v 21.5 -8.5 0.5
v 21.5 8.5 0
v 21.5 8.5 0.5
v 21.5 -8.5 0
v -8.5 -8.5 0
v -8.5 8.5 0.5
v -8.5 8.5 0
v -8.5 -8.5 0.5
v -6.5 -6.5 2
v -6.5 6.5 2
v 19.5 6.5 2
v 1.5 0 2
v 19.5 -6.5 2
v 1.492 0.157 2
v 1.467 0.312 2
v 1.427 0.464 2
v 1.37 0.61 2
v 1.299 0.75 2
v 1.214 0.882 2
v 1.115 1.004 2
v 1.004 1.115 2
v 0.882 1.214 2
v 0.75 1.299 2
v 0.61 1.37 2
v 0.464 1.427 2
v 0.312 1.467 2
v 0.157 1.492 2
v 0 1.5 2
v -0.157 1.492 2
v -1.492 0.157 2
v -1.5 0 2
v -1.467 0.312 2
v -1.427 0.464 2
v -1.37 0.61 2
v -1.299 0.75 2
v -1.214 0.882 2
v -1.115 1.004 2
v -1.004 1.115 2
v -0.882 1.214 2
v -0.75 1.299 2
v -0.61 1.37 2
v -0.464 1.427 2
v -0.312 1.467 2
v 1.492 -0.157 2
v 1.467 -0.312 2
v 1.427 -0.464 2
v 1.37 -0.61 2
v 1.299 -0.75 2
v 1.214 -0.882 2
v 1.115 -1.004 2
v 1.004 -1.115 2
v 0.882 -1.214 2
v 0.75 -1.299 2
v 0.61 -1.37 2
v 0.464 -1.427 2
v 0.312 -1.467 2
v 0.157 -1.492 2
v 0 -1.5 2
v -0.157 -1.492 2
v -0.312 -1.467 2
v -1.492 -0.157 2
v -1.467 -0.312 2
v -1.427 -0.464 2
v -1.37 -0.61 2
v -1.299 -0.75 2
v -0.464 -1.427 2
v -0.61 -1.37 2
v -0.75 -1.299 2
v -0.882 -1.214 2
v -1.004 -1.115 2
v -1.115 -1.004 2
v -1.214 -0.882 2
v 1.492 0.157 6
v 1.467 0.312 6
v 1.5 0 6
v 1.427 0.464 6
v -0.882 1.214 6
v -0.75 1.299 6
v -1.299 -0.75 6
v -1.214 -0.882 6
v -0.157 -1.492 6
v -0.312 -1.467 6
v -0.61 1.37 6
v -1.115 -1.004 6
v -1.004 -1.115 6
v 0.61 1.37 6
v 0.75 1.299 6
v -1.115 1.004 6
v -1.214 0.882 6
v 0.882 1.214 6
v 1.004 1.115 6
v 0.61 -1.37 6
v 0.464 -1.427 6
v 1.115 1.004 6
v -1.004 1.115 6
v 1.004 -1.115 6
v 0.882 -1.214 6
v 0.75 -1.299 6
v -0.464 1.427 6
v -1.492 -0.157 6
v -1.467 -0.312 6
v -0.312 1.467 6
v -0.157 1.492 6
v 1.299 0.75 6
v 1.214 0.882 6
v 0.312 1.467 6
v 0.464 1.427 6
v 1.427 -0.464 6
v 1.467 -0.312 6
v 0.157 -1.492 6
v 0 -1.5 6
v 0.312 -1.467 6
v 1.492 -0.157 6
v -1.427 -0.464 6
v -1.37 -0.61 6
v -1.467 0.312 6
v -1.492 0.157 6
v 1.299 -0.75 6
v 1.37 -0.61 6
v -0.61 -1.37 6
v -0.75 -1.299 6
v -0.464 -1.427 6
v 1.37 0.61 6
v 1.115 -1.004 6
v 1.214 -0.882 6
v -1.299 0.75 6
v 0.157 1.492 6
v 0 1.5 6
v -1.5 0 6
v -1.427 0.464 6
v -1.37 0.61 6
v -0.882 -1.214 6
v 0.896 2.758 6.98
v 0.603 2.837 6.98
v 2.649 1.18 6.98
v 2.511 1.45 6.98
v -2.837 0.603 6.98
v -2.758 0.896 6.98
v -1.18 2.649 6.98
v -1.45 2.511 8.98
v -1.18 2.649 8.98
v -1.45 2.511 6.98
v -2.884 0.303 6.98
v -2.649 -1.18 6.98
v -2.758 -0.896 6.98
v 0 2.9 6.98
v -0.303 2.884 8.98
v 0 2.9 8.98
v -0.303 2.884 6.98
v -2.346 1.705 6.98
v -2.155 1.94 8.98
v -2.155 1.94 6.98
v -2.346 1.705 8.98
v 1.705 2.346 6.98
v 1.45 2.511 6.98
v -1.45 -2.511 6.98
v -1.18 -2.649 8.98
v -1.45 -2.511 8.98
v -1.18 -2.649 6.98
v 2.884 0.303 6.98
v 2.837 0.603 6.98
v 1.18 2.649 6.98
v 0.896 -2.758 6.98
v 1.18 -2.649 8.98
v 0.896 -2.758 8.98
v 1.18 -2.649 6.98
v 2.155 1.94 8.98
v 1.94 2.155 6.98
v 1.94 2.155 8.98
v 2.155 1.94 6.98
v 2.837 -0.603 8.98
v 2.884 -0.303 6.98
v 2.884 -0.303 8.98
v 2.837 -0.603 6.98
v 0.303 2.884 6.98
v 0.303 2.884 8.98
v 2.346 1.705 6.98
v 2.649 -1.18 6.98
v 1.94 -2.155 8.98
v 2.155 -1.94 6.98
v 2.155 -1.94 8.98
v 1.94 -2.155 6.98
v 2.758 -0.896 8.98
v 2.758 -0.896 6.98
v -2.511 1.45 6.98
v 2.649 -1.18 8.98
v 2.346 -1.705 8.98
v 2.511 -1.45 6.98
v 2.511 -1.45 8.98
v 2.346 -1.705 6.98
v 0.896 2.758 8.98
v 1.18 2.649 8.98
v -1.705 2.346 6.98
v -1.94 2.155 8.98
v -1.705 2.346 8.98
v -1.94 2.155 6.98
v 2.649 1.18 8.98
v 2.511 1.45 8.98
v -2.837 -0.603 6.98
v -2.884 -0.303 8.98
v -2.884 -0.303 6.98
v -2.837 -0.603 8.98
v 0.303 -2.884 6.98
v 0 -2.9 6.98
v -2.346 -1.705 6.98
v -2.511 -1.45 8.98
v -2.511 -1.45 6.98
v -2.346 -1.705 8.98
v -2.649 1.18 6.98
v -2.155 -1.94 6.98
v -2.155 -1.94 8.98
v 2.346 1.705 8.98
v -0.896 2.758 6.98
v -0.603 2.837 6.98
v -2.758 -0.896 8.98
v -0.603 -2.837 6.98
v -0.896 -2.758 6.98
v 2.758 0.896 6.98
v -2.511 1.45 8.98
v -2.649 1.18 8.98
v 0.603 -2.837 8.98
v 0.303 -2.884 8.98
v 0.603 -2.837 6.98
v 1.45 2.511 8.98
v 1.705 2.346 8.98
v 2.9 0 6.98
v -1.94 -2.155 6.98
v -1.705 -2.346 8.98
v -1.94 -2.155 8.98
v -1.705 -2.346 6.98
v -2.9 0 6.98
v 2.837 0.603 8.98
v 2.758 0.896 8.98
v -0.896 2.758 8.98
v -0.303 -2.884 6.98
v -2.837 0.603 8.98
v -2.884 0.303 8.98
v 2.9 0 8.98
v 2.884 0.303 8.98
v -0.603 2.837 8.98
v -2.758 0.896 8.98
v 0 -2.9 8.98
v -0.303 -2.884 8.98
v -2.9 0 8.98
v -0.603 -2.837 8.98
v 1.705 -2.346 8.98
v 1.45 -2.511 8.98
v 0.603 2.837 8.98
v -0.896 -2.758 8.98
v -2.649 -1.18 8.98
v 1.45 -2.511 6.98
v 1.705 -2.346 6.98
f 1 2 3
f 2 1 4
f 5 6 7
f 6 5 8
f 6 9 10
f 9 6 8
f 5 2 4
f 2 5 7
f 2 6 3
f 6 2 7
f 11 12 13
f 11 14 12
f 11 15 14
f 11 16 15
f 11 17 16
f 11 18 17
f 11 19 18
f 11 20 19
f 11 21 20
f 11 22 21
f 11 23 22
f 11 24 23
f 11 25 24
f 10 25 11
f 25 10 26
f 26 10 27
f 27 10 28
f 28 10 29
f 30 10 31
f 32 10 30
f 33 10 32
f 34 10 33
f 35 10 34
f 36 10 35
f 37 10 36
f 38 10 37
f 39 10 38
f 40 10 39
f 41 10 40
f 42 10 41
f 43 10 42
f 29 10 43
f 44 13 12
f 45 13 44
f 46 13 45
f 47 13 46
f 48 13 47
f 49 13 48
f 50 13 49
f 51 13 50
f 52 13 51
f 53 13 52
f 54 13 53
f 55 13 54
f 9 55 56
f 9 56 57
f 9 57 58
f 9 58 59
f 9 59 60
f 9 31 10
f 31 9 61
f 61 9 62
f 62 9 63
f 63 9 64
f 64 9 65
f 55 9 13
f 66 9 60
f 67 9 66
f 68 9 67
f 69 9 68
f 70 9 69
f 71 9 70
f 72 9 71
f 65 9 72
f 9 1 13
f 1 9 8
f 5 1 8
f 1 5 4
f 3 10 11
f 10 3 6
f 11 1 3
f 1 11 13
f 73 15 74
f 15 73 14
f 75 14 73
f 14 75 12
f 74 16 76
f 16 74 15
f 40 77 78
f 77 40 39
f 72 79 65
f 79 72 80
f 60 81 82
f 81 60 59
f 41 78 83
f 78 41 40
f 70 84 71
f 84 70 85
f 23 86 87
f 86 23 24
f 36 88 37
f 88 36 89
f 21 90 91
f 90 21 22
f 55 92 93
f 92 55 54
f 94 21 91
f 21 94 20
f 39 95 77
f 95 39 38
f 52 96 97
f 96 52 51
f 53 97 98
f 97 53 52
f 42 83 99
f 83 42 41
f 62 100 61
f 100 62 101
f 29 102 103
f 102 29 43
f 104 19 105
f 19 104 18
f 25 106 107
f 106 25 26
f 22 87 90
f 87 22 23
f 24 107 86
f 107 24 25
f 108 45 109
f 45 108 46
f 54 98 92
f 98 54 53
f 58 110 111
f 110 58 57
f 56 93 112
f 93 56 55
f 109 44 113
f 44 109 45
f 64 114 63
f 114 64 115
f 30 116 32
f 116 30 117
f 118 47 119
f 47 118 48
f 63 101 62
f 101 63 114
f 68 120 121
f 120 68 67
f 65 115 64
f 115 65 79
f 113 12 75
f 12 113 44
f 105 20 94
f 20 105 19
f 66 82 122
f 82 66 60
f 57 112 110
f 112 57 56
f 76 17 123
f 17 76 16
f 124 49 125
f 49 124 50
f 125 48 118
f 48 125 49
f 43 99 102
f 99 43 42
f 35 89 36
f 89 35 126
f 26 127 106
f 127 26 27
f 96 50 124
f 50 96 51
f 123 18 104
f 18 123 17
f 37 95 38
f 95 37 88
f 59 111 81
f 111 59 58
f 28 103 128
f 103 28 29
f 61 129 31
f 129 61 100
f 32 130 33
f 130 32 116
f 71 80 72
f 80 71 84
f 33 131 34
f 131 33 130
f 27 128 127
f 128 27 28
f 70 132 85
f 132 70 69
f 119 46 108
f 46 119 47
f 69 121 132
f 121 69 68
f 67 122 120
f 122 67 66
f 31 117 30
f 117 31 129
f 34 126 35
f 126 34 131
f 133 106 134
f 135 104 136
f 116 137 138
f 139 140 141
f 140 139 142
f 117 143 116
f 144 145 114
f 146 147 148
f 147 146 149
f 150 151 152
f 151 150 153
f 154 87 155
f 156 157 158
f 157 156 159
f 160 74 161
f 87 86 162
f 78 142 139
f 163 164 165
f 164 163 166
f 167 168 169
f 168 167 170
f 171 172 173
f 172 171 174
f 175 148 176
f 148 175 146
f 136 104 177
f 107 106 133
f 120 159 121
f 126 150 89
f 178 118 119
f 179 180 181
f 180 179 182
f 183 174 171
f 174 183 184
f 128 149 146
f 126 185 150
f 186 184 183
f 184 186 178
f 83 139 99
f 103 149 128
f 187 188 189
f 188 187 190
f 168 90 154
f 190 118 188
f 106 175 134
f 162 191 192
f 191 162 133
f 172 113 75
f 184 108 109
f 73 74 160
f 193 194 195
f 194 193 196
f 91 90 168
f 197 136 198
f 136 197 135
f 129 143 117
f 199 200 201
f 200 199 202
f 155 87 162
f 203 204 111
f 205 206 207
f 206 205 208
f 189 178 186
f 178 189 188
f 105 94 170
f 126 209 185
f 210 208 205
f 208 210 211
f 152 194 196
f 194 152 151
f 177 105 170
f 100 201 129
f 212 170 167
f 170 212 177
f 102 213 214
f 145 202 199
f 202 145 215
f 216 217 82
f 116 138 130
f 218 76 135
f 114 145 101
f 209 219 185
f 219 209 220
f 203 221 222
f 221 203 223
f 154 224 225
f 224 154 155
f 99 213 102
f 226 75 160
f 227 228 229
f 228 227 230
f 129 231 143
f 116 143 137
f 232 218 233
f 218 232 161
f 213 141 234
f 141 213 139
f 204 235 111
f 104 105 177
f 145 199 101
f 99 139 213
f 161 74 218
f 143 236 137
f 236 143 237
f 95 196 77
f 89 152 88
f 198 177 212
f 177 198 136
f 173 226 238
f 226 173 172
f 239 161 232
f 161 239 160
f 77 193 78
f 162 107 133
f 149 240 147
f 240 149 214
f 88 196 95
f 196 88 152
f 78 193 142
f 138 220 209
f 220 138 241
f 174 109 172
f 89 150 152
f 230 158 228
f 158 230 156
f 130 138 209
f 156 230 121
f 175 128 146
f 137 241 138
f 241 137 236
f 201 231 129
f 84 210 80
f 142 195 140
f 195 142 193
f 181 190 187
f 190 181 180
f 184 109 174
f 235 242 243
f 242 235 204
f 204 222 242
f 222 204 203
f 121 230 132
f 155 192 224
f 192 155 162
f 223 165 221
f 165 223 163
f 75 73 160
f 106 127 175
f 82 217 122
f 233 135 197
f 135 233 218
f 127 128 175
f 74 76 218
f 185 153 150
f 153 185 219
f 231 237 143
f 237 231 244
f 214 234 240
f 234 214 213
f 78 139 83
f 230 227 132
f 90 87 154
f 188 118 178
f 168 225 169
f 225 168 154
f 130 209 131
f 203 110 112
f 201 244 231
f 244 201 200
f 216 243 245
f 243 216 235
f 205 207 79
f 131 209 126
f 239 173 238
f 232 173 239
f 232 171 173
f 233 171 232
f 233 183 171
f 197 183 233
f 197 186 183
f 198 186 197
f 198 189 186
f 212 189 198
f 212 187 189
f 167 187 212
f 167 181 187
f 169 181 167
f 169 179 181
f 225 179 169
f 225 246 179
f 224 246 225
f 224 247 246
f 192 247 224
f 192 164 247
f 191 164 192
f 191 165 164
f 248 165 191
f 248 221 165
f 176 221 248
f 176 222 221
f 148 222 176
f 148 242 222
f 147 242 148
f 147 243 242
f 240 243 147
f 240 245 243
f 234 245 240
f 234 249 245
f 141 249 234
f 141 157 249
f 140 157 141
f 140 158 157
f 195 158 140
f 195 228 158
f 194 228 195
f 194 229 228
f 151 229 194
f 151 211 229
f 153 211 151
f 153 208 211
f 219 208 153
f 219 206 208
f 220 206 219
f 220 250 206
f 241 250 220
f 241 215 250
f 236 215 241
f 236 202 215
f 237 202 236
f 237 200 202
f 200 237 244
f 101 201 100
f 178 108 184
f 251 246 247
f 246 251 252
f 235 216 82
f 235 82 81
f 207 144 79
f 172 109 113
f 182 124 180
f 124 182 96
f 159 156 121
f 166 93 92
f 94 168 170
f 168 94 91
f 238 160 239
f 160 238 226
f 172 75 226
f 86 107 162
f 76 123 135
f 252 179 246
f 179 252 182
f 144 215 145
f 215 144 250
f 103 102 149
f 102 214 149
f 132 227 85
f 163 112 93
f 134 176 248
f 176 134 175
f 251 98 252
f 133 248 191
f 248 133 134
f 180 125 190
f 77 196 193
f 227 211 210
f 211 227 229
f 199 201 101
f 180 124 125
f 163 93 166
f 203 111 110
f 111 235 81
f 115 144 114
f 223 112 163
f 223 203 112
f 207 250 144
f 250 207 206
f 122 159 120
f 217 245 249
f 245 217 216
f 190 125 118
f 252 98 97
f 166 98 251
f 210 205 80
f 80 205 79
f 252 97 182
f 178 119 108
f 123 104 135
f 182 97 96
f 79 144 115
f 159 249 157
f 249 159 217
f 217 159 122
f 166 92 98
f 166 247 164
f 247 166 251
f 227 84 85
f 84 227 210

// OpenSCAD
// file: lib-command.scad
// Height is defined as the length from the non-tab end to where the adhesive stops opposite it — thus the minimum length required for a hook to not have either the strip sticking out both ends or the adhesive revealed.

command_small_w = 17;
command_small_h = 30;
command_medium_w = 16;
command_medium_h = 52;
command_large_w = 19;
command_large_h = 76;

// TODO: record size of "mini" strips. Note also that mini strips are slightly narrower than the picture hanging "stabilization" strips.
// main file
include <lib-command.scad>

head_diameter = 5.8;
head_thickness = 2;
shank_diameter = 3;
shank_length = 4;
flat_thickness = 2;

overhang_slope = 0.7;

$fn = 60;
epsilon = 0.01;

main();

module main() {
    translate([-command_small_w /* not a typo */ / 2, -command_small_w / 2, 0])
    bevel_cube([command_small_h, command_small_w, flat_thickness], 0.5);

    cylinder(d=shank_diameter, h=flat_thickness + shank_length + head_thickness);
    
    translate([0, 0, flat_thickness + shank_length])
    hull() {
        cylinder(d=shank_diameter, h=epsilon);

        translate([0, 0, (head_diameter - shank_diameter) * overhang_slope / 2])
        cylinder(d=head_diameter, h=head_thickness);
    }
}

module bevel_cube(dims, edge) {
    inset = dims.z;
    
    hull() {
        cube([dims.x, dims.y, edge]);
        
        translate([inset, inset, dims.z - edge])
        cube([dims.x - inset * 2, dims.y - inset * 2, edge]);
    }
}
